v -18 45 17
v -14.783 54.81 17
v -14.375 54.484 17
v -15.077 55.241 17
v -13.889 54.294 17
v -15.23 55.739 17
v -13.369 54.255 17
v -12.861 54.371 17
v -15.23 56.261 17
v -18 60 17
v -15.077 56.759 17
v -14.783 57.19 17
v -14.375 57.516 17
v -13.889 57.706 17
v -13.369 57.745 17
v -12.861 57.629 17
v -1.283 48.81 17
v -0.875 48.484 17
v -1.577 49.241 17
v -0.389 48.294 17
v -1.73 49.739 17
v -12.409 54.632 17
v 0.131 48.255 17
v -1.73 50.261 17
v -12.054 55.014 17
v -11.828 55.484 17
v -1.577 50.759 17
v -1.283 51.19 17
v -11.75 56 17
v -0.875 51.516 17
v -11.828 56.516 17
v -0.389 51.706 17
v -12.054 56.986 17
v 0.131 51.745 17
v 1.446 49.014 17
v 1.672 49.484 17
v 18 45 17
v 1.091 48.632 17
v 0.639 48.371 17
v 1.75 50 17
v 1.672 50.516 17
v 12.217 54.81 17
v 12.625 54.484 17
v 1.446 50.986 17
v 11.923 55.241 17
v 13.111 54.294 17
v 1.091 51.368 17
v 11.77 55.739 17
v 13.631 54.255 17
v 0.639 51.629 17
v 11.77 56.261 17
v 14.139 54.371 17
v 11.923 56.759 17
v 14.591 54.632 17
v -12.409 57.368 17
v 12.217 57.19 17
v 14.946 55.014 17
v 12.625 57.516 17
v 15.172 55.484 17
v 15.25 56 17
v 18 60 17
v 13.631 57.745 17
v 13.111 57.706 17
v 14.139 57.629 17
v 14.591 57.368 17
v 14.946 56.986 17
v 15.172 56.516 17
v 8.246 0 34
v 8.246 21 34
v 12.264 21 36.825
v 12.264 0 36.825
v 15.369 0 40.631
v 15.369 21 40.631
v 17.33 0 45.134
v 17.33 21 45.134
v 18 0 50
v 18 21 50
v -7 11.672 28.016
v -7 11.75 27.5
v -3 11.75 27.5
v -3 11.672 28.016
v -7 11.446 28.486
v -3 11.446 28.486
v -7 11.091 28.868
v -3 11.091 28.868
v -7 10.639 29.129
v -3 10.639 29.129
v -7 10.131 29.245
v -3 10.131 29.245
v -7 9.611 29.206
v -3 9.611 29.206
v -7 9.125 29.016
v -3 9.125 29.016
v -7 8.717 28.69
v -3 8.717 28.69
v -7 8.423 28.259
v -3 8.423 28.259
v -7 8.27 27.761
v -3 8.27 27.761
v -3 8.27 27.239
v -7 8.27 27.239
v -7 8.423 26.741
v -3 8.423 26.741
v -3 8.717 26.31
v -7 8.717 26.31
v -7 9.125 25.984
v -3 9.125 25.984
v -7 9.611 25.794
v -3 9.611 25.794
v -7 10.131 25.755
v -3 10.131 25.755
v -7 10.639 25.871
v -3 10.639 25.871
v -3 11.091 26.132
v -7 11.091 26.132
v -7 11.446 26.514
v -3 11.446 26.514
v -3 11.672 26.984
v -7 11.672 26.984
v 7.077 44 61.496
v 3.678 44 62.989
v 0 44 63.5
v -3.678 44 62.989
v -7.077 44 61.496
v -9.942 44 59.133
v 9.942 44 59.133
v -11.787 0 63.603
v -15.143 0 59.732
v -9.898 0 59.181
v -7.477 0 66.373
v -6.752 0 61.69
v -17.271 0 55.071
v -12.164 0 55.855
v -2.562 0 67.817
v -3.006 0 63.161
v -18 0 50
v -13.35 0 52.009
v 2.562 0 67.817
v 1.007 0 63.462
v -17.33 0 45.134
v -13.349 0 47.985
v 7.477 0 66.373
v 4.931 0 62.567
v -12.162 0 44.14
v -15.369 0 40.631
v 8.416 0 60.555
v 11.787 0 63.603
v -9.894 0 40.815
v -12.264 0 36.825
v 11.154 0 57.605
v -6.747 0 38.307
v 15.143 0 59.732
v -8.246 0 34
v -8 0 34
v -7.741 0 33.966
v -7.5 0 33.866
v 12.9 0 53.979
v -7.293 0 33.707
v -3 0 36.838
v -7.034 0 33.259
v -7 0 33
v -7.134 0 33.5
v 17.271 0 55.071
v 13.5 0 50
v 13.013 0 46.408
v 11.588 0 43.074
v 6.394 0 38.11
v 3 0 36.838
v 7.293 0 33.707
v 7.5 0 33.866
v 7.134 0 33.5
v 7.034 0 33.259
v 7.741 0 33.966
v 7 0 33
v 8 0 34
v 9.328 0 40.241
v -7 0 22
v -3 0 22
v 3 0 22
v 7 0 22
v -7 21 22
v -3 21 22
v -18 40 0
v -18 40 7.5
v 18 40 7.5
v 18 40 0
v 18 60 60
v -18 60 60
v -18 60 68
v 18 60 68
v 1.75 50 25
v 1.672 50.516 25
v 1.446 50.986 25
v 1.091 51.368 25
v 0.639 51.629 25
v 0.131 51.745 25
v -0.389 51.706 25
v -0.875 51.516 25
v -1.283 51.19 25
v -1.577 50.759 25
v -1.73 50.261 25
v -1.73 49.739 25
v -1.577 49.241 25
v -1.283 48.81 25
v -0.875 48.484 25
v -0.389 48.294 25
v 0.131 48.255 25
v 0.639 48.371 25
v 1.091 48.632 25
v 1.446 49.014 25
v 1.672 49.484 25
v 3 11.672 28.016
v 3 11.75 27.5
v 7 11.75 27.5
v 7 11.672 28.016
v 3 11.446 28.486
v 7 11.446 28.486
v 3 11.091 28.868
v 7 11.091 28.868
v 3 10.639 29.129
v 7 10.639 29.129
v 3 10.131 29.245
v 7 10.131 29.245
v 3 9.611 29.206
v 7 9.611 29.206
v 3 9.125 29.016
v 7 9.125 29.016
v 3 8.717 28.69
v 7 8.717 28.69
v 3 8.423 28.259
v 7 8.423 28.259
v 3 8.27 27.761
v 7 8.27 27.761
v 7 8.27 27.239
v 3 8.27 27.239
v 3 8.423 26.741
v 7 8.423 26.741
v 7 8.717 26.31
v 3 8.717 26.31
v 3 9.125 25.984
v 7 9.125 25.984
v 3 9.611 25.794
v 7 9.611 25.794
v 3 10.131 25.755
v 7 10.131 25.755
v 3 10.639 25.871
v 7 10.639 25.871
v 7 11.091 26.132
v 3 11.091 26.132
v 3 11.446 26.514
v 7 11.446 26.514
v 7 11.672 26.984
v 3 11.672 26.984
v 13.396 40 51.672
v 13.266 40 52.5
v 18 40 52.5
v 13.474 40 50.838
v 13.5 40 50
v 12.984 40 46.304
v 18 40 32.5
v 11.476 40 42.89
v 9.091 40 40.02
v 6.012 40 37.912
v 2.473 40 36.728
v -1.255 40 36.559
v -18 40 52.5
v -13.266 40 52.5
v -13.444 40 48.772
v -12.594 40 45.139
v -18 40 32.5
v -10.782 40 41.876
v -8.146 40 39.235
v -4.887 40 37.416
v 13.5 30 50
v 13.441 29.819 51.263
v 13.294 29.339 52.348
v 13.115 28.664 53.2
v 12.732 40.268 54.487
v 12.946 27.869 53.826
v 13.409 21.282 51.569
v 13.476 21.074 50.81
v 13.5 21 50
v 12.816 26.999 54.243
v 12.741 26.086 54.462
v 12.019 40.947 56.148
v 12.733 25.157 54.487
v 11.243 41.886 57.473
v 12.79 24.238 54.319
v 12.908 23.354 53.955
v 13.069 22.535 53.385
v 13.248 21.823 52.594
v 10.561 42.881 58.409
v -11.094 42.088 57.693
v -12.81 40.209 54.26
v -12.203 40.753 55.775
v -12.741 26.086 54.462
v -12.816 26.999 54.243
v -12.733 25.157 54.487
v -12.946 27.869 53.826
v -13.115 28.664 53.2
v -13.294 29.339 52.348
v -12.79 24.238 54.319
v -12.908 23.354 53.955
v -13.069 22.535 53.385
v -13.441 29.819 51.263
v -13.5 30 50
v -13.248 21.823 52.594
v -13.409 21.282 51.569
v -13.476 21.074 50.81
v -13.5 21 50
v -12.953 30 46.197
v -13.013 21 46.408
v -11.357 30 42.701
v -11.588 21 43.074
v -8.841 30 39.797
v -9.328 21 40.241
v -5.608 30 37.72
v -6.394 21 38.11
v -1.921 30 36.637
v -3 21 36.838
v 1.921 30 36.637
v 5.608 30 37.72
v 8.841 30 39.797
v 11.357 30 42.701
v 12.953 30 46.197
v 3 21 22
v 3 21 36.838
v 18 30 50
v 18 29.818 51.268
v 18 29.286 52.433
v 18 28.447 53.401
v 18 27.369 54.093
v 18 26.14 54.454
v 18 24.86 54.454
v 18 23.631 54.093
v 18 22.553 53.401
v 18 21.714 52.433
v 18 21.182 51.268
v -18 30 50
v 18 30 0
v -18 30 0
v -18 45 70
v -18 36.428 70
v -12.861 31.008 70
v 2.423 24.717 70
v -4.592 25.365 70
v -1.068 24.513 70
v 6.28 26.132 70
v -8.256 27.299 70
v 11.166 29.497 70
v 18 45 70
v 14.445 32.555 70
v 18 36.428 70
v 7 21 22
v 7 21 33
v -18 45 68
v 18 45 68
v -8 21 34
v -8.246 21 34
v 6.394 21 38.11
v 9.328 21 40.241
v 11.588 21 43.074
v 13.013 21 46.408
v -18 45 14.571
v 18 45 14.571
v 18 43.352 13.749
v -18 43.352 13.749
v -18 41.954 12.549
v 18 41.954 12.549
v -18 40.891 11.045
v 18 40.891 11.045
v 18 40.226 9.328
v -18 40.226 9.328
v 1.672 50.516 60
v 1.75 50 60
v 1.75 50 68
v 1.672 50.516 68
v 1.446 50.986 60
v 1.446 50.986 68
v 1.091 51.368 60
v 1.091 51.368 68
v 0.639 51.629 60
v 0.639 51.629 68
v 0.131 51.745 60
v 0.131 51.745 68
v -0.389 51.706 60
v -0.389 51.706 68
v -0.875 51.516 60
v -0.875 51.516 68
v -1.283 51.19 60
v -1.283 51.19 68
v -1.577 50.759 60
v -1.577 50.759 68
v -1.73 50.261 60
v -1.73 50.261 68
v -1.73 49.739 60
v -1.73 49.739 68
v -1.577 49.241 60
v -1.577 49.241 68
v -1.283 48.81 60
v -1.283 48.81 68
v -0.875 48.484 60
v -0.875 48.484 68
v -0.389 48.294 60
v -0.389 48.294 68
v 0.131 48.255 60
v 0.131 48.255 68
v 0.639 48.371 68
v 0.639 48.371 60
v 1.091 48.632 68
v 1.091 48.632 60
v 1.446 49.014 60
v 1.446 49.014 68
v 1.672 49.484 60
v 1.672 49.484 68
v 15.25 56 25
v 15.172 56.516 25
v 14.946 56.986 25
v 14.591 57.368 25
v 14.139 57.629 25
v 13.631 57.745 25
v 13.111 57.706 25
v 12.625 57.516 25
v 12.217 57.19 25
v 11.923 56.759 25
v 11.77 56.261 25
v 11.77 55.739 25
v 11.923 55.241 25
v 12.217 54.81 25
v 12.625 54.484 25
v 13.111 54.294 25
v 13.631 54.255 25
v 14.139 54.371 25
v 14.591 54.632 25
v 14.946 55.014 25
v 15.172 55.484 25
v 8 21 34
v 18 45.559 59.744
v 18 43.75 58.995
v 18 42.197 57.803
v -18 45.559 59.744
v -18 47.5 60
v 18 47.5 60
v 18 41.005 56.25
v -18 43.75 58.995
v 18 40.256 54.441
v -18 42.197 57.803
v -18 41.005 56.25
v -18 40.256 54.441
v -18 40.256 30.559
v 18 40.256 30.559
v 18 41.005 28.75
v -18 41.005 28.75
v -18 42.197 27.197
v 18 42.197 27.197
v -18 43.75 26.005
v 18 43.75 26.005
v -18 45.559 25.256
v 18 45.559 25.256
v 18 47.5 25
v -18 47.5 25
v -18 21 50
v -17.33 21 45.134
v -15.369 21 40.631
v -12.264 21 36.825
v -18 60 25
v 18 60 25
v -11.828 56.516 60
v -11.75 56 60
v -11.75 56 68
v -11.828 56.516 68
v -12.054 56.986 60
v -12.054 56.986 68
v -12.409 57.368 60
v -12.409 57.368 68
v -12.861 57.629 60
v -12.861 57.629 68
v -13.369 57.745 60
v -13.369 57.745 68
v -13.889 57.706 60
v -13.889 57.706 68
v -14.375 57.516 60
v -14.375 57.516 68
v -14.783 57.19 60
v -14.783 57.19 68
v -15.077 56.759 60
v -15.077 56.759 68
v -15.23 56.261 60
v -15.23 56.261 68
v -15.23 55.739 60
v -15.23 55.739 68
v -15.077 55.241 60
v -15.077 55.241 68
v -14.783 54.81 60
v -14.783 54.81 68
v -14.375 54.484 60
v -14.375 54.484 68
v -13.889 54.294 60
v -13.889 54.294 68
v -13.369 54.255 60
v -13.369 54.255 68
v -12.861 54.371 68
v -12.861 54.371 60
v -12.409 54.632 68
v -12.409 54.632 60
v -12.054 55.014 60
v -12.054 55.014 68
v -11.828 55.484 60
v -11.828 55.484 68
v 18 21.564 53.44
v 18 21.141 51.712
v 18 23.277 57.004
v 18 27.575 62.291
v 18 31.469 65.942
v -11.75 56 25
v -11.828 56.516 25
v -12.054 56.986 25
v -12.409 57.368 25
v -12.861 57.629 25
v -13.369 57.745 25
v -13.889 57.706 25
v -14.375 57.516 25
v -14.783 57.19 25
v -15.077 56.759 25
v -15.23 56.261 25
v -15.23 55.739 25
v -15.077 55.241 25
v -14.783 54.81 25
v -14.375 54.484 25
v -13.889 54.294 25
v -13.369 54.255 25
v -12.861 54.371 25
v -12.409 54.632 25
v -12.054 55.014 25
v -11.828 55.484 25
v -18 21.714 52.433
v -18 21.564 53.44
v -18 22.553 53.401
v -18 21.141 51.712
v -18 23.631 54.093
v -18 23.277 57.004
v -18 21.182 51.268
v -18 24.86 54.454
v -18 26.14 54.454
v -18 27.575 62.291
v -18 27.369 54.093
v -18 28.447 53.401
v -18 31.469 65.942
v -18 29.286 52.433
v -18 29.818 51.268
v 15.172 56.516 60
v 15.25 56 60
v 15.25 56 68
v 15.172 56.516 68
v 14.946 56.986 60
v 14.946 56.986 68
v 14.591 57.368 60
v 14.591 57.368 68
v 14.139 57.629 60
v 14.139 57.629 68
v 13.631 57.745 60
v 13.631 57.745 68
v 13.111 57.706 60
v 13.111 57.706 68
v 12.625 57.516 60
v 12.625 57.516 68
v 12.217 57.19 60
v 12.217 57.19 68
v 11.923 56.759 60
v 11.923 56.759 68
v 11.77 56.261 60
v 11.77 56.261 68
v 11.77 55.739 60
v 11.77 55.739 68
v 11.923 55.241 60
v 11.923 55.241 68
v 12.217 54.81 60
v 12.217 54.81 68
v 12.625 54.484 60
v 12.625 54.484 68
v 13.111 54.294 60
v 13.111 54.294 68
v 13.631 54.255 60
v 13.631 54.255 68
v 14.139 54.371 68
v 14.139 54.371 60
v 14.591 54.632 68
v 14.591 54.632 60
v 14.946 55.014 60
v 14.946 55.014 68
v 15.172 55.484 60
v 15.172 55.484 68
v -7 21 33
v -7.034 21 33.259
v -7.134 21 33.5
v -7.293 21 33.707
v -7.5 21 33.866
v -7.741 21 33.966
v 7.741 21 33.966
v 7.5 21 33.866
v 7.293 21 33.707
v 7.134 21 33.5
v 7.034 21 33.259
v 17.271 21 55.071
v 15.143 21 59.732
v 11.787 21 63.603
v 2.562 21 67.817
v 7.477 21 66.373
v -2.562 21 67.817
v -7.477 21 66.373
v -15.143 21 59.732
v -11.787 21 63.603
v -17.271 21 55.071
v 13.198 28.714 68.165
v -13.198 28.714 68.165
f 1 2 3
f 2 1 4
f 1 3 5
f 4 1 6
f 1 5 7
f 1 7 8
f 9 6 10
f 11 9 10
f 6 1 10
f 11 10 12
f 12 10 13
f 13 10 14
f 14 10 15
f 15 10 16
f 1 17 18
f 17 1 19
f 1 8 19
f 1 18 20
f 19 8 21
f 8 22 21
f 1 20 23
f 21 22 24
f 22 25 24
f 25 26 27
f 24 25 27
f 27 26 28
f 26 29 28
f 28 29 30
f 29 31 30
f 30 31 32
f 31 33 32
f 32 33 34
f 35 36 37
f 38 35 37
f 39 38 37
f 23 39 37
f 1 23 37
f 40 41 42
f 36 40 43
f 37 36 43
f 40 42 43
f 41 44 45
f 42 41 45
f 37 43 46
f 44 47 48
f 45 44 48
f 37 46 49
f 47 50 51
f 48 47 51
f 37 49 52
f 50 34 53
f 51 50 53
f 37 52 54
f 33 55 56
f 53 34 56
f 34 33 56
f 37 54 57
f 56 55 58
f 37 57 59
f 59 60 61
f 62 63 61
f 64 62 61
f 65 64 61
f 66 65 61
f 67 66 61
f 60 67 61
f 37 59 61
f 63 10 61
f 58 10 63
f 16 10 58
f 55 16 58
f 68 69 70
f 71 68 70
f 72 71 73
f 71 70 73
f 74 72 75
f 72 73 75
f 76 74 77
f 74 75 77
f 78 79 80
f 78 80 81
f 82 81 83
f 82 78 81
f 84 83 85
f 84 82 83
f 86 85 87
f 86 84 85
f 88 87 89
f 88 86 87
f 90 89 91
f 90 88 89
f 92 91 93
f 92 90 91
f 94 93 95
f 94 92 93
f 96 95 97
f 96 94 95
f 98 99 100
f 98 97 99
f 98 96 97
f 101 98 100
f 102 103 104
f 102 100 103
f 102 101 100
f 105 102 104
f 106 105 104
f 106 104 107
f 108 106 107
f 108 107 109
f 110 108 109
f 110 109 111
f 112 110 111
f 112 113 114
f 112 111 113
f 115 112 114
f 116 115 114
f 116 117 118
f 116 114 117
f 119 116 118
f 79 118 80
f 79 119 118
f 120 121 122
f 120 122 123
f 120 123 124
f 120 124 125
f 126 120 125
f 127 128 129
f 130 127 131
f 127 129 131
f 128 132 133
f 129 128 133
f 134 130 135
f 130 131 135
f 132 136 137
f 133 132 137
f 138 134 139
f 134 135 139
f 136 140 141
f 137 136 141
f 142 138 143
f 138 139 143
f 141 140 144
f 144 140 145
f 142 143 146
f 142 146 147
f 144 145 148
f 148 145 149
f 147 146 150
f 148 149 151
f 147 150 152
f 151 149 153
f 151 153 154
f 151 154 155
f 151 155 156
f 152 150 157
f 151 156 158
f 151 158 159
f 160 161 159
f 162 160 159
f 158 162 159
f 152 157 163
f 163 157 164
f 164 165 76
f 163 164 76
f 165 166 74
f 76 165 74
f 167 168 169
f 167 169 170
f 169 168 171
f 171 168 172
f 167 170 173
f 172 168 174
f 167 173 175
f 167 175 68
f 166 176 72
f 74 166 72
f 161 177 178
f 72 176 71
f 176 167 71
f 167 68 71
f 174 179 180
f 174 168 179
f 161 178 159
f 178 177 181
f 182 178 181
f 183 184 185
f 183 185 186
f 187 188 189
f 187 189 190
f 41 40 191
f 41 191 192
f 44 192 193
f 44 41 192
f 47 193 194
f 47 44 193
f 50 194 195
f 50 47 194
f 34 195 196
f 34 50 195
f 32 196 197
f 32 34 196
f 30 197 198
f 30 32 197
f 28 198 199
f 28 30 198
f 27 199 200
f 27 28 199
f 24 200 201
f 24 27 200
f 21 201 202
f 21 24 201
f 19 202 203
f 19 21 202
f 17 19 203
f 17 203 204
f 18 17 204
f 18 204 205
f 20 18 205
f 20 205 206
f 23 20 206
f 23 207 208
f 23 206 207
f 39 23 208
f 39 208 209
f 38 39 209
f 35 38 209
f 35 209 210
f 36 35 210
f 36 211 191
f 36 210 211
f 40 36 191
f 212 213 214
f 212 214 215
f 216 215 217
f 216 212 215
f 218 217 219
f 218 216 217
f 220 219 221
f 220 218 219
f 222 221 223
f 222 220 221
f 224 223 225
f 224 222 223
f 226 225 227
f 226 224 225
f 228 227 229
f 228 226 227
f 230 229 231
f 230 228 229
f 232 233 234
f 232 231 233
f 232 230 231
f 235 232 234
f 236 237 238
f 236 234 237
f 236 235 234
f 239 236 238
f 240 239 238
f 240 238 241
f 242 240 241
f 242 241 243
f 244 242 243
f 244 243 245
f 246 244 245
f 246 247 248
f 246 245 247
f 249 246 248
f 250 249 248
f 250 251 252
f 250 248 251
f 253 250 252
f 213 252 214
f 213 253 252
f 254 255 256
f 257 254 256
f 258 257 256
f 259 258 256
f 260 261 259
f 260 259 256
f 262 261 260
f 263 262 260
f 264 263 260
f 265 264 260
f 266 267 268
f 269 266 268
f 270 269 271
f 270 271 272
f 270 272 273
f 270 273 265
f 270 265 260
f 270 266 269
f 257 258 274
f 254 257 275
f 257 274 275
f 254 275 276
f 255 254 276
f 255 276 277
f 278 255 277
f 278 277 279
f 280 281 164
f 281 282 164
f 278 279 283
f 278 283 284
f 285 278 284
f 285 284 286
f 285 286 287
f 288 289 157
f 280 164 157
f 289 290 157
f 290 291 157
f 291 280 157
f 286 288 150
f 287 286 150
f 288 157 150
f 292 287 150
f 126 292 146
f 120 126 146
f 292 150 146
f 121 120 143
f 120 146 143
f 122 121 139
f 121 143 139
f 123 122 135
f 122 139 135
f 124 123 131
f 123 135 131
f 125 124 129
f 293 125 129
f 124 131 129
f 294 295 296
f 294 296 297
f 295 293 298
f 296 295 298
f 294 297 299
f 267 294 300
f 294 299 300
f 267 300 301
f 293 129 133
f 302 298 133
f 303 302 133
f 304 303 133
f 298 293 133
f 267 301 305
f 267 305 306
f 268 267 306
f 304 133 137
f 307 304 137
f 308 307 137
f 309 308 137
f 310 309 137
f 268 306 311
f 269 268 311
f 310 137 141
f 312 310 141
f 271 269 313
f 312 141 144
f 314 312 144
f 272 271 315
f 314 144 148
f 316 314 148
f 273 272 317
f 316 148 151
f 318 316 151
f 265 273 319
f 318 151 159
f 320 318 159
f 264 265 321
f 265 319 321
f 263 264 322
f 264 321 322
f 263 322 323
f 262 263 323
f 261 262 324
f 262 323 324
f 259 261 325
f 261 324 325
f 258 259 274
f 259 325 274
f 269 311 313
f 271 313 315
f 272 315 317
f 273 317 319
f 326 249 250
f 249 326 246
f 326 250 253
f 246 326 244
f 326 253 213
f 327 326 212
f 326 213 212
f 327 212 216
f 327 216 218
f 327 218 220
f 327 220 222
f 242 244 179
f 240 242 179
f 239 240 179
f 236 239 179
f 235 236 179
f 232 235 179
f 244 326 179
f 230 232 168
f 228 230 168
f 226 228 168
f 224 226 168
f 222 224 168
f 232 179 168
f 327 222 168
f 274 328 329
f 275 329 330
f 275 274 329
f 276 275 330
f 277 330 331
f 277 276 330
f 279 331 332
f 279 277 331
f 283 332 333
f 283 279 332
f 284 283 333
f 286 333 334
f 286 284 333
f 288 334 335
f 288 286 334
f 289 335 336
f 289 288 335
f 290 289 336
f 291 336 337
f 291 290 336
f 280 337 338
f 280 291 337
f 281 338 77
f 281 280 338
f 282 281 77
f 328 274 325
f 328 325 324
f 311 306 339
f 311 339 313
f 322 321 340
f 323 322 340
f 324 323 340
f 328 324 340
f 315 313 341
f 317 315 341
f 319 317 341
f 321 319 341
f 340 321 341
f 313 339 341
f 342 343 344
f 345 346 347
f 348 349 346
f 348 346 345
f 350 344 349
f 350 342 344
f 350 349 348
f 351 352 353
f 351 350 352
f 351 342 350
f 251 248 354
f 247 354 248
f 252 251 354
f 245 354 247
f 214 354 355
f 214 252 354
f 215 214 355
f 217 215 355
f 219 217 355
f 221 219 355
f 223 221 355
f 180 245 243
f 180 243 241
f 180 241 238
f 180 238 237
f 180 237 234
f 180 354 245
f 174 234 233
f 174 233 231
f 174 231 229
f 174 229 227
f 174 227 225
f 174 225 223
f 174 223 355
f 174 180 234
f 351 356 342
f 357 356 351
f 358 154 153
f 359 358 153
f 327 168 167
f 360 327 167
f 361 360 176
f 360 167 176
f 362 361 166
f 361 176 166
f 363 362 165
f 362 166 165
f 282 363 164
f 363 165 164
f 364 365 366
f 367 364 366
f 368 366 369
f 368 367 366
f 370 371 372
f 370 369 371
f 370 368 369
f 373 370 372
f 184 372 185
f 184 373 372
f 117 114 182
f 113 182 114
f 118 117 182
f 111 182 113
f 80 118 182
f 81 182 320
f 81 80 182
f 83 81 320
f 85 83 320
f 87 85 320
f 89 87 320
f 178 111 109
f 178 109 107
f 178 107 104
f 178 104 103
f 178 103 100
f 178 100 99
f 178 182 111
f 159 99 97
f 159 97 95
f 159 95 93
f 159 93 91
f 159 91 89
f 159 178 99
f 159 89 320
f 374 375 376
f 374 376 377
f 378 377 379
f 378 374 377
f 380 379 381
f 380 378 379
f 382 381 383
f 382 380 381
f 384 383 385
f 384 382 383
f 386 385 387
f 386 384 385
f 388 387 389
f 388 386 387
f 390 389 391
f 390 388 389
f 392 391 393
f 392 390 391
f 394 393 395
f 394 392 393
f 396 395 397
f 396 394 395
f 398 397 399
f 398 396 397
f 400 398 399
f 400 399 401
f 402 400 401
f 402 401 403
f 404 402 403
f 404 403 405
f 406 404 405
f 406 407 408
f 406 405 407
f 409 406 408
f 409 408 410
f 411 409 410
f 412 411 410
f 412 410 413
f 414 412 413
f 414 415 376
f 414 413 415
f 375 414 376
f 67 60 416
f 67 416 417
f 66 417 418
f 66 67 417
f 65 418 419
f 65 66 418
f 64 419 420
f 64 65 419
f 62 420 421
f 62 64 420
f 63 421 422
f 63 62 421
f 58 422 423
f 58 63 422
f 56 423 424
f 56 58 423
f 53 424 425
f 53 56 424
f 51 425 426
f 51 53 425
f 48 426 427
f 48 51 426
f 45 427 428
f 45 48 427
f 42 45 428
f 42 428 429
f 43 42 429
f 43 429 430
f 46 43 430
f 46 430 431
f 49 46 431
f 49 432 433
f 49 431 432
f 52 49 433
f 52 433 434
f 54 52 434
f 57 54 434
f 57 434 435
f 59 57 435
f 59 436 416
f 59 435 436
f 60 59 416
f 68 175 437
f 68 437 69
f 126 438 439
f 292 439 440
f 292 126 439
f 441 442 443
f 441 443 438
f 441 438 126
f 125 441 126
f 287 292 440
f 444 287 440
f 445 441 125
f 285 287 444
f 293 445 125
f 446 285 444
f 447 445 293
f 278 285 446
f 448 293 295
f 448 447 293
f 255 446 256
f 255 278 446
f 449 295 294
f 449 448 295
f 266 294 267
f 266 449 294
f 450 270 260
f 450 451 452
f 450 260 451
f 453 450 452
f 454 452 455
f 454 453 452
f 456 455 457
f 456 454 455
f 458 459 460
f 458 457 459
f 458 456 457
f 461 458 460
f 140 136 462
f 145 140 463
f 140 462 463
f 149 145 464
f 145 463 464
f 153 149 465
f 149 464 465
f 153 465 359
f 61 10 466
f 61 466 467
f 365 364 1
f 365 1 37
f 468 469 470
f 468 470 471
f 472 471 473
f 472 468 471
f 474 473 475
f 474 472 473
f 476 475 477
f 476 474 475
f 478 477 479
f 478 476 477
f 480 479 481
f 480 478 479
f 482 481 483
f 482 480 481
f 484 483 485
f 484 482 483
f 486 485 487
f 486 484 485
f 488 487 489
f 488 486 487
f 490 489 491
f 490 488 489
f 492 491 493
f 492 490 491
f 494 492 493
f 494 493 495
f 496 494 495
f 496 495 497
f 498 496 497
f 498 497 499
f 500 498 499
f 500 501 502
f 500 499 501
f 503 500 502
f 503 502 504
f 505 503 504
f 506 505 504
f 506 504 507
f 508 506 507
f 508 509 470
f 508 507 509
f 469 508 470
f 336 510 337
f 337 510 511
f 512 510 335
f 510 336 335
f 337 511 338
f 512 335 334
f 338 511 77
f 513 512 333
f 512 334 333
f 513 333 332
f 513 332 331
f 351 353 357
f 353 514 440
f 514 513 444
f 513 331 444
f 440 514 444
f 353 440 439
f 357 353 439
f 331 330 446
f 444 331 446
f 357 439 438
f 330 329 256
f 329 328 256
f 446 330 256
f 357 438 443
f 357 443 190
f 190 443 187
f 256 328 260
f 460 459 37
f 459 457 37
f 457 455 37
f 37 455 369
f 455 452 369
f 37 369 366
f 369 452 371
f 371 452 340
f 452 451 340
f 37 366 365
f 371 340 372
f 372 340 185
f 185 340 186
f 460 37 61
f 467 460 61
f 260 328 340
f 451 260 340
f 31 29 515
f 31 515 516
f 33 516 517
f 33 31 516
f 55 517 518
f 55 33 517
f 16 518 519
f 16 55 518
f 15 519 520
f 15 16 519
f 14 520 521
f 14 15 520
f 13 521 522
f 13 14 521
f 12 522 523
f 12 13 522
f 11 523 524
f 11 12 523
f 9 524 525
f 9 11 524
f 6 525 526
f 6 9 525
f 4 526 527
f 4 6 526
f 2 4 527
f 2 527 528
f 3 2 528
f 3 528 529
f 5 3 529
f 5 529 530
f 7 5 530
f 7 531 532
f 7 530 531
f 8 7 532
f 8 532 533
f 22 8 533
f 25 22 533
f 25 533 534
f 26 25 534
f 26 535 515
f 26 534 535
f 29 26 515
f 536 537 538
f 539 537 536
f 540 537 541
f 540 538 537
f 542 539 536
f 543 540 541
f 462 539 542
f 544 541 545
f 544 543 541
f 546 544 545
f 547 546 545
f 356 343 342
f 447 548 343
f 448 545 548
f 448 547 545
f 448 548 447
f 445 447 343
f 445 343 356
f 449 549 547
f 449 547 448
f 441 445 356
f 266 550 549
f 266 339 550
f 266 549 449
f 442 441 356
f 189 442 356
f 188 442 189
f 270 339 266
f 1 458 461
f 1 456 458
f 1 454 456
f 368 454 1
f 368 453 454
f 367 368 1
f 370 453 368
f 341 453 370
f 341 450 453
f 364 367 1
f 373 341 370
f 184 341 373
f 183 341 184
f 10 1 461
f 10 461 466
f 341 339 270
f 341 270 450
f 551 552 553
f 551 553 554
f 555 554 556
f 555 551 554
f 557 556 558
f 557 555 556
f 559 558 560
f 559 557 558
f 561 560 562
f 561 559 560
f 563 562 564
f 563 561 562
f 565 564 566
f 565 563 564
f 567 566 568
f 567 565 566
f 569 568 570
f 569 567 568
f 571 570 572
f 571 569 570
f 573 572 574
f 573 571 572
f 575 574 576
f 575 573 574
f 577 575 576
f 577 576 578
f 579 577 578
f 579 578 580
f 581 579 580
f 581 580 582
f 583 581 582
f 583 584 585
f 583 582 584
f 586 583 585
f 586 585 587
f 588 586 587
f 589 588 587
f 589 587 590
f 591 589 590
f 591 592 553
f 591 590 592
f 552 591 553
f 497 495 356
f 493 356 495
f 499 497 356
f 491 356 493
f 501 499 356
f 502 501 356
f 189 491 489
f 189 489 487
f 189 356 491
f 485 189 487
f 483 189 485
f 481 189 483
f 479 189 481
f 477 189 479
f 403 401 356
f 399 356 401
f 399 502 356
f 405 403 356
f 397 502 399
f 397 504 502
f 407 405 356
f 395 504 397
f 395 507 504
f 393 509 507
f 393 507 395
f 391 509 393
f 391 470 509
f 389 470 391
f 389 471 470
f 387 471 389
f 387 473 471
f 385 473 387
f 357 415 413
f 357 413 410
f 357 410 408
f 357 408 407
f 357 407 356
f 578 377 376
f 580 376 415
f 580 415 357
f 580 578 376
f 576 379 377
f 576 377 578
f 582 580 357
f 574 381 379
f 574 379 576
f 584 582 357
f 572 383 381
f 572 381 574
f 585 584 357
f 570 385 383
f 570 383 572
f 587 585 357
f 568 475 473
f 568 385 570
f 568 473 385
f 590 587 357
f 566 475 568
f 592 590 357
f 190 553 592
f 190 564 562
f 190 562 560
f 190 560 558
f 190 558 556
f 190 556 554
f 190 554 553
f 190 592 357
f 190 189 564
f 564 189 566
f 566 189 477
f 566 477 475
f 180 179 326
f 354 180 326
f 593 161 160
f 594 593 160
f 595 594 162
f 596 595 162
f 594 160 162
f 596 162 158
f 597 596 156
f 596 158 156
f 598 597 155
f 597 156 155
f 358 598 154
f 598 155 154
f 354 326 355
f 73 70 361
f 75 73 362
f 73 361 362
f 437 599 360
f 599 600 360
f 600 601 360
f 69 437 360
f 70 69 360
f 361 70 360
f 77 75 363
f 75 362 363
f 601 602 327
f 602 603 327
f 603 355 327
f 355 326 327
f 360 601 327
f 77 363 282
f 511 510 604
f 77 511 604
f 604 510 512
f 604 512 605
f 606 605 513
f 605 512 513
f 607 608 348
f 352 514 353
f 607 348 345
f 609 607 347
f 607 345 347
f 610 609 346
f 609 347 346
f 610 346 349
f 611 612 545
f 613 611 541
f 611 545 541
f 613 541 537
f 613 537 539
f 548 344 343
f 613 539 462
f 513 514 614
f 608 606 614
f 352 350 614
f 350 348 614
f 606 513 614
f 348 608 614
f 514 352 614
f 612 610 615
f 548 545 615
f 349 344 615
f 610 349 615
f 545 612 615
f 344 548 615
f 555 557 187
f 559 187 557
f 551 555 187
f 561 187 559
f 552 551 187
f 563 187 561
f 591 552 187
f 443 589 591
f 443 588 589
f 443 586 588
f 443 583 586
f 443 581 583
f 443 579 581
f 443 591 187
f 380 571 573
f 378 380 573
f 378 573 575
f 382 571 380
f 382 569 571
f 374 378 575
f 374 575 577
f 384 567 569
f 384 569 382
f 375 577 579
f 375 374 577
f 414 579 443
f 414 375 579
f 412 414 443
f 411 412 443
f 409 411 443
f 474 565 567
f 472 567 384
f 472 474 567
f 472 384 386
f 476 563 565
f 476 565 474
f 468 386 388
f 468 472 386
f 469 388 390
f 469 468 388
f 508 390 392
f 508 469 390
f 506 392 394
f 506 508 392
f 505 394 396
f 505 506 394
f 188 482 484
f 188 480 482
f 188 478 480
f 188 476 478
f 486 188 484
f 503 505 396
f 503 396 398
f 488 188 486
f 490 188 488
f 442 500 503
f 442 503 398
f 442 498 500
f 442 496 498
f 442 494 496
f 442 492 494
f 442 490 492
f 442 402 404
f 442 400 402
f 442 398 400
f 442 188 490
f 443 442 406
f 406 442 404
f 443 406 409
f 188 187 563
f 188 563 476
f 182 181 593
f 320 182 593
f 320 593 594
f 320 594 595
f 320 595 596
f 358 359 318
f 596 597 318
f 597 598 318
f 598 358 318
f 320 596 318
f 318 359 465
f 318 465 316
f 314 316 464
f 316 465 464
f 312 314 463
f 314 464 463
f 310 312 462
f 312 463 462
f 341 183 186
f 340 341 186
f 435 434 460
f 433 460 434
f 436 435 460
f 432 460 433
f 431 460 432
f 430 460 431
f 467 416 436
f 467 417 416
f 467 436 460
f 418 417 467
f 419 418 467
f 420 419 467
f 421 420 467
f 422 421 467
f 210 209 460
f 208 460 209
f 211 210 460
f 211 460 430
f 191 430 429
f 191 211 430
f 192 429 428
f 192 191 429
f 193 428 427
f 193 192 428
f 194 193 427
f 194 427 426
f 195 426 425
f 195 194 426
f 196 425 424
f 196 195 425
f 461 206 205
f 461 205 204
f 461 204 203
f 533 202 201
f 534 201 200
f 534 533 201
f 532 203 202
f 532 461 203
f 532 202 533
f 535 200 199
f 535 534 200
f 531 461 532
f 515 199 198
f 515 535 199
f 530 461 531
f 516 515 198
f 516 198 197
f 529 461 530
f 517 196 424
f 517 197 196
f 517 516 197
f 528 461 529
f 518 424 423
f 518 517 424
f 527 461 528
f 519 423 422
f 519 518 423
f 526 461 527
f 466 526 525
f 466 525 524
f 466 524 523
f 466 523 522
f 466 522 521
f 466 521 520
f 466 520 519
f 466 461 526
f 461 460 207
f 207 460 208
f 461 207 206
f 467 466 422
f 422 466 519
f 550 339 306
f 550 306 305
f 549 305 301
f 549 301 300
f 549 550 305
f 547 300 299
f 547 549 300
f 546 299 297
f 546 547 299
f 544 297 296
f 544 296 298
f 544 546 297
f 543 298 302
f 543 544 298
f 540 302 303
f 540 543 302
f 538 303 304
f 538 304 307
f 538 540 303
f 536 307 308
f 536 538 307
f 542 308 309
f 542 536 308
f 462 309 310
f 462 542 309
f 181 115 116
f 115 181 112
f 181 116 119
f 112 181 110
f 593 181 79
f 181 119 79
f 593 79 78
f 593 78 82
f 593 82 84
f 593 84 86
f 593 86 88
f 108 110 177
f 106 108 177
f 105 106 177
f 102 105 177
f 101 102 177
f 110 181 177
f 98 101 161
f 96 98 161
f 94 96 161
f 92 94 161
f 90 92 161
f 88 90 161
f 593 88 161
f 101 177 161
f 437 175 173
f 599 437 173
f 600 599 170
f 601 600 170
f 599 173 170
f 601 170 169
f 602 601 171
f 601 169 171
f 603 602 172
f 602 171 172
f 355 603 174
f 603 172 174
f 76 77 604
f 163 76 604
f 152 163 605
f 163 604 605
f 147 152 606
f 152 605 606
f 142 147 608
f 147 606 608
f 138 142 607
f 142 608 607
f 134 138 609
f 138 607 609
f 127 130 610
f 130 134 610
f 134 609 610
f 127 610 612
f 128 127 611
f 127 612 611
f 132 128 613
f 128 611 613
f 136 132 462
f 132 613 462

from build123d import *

# Parameters (mm, degrees)
SKETCH021_R                          = 1.75
EXTRUDE005_DEPTH                     = 15
SKETCH020_W                          = 40
SKETCH020_H                          = 16
EXTRUDE003_DEPTH                     = 3
SKETCH016_AS_DRAWN_R                 = 13.5
EXTRUDE001_DEPTH                     = 45
EXTRUDE001_ONTO_SKETCH016_ROLL_ANGLE = 90
SKETCH017_AS_DRAWN_W                 = 6
SKETCH017_AS_DRAWN_H                 = 25
EXTRUDE002_DEPTH                     = 30
EXTRUDE002_ONTO_SKETCH017_ROLL_ANGLE = 90
EXTRUDE006_DEPTH                     = 15
EXTRUDE004_DEPTH                     = 3
SKETCH_R                             = 1.75
EXTRUDE_DEPTH                        = 38
SKETCH014_W                          = 22
SKETCH014_H                          = 20
BOX_W                                = 36
BOX_H                                = 60
BOX_DEPTH                            = 70


with BuildPart() as extrude005:
    # Sketch021 → Extrude005 (new body)
    with BuildSketch(Plane.XY):
        with Locations((-13.5, 56)):
            Circle(SKETCH021_R)
        with Locations((13.5, 56)):
            Circle(SKETCH021_R)
        with Locations((0, 50)):
            Circle(SKETCH021_R)
    extrude(amount=EXTRUDE005_DEPTH)


with BuildPart() as extrude005_1:
    # Extrude005 placement: moved
    add(extrude005.part.moved(Location((0, 0, 13))))


with BuildPart() as extrude003:
    # Sketch020 → Extrude003 (new body)
    with BuildSketch(Plane.XY):
        with Locations((0, 53)):
            Rectangle(SKETCH020_W, SKETCH020_H)
    extrude(amount=EXTRUDE003_DEPTH)


with BuildPart() as extrude003_1:
    # Extrude003 placement: moved
    add(extrude003.part.moved(Location((0, 0, 68))))


with BuildPart() as extrude_tube_hole:
    # Sketch016 as drawn → Extrude001 (new)
    with BuildSketch(Plane.XY):
        with Locations((0, 50)):
            Circle(SKETCH016_AS_DRAWN_R)
    extrude(amount=-EXTRUDE001_DEPTH)


with BuildPart() as extrude_tube_hole_1:
    # Extrude001 onto Sketch016 roll: moved
    add(extrude_tube_hole.part.rotate(Axis((0, 0, 0), (1, 0, 0)), EXTRUDE001_ONTO_SKETCH016_ROLL_ANGLE))


with BuildPart() as extrude_tube_hole_2:
    # Extrude001 onto Sketch016 placement: moved
    add(extrude_tube_hole_1.part)


with BuildPart() as extrude_tube_hole_3:
    # Extrude001 placement: moved
    add(extrude_tube_hole_2.part.moved(Location((0, -1, 0))))


with BuildPart() as arc_ext:
    # Sketch017 as drawn → Extrude002 (new)
    with BuildSketch(Plane.XY):
        with BuildLine():
            Line((8, 34), (20, 34))
            Line((20, 34), (20, 20))
            Line((20, 20), (7, 20))
            Line((7, 20), (7, 33))
            ThreePointArc((8, 34), (7.292893, 33.707107), (7, 33))
        make_face()
        with BuildLine():
            Line((-8, 34), (-20, 34))
            Line((-20, 34), (-20, 20))
            Line((-20, 20), (-7, 20))
            Line((-7, 20), (-7, 33))
            ThreePointArc((-7, 33), (-7.292893, 33.707107), (-8, 34))
        make_face()
        with Locations((0, 27.5)):
            Rectangle(SKETCH017_AS_DRAWN_W, SKETCH017_AS_DRAWN_H)
    extrude(amount=-EXTRUDE002_DEPTH)


with BuildPart() as arc_ext_1:
    # Extrude002 onto Sketch017 roll: moved
    add(arc_ext.part.rotate(Axis((0, 0, 0), (1, 0, 0)), EXTRUDE002_ONTO_SKETCH017_ROLL_ANGLE))


with BuildPart() as arc_ext_2:
    # Extrude002 onto Sketch017 placement: moved
    add(arc_ext_1.part)


with BuildPart() as arc_ext_3:
    # Extrude002 placement: moved
    add(arc_ext_2.part.moved(Location((0, -1, 0))))


with BuildPart() as extrude006:
    # Sketch021 → Extrude006 (new body)
    with BuildSketch(Plane.XY):
        with Locations((-13.5, 56)):
            Circle(SKETCH021_R)
        with Locations((13.5, 56)):
            Circle(SKETCH021_R)
        with Locations((0, 50)):
            Circle(SKETCH021_R)
    extrude(amount=EXTRUDE006_DEPTH)


with BuildPart() as extrude006_1:
    # Extrude006 placement: moved
    add(extrude006.part.moved(Location((0, 0, 58))))


with BuildPart() as extrude004:
    # Sketch020 → Extrude004 (new body)
    with BuildSketch(Plane.XY):
        with Locations((0, 53)):
            Rectangle(SKETCH020_W, SKETCH020_H)
    extrude(amount=EXTRUDE004_DEPTH)


with BuildPart() as extrude004_1:
    # Extrude004 placement: moved
    add(extrude004.part.moved(Location((0, 0, 14))))


with BuildPart() as fusion001:
    # Sketch → Extrude (new body)
    with BuildSketch(Plane.YZ):
        with Locations((10, 27.5)):
            Circle(SKETCH_R)
        with BuildLine():
            Line((61, 60), (47.5, 60))
            ThreePointArc((47.5, 60), (42.196699, 57.803301), (40, 52.5))
            Line((40, 52.5), (40, 32.5))
            ThreePointArc((40, 32.5), (42.196699, 27.196699), (47.5, 25))
            Line((47.5, 25), (61, 25))
            Line((61, 25), (61, 60))
        make_face()
        with BuildLine():
            Line((61, 15), (47.5, 15))
            ThreePointArc((47.5, 15), (42.196699, 12.803301), (40, 7.5))
            Line((40, 7.5), (40, -2))
            Line((40, -2), (61, -2))
            Line((61, -2), (61, 15))
        make_face()
        with BuildLine():
            Line((30, 50), (30, -2))
            Line((30, -2), (-2, -2))
            Line((-2, -2), (-2, 22))
            Line((-2, 22), (21, 22))
            Line((21, 22), (21, 50))
            ThreePointArc((30, 50), (25.5, 54.5), (21, 50))
        make_face()
    extrude(amount=EXTRUDE_DEPTH)


with BuildPart() as fusion001_1:
    # Extrude placement: moved
    add(fusion001.part.moved(Location((-19, 0, 0))))

    # Fusion001: union Extrude005, Extrude003, Extrude-tube-hole, arc-ext, Extrude006, Extrude004
    add(extrude005_1.part)
    add(extrude003_1.part)
    add(extrude_tube_hole_3.part)
    add(arc_ext_3.part)
    add(extrude006_1.part)
    add(extrude004_1.part)


with BuildPart() as sweep_body:
    # Sweep: sweep along a path in Sketch015
    with BuildLine(Plane.XZ) as sweep_path:
        ThreePointArc((4, 40.834849), (0, 60), (-4, 40.834849))
    # Sketch014 → Sweep (sweep)
    with BuildSketch(Plane(origin=(0, -1, 0), x_dir=(0, 1, 0), z_dir=(1, 0, 0))):
        with Locations((11, 78)):
            Rectangle(SKETCH014_W, SKETCH014_H)
    sweep(path=sweep_path.line)


with BuildPart() as fusion:
    # Sweep001: sweep along a path in Sketch019
    with BuildLine(Plane.XZ) as sweep001_path:
        ThreePointArc((10, 50), (0, 60), (-10, 50))
    # Sketch018 → Sweep001 (sweep)
    with BuildSketch(Plane(origin=(0, -1, 0), x_dir=(0, 1, 0), z_dir=(1, 0, 0))):
        Polygon((22, 68), (0, 68), (82.621778, 103), align=None)
    sweep(path=sweep001_path.line)

    # Fusion: union Sweep body
    add(sweep_body.part)


with BuildPart() as cut001:
    # Box → Box (new body)
    with BuildSketch(Plane(origin=(-18, 0, 0), x_dir=(1, 0, 0), z_dir=(0, 0, 1))):
        with Locations((18, 30)):
            Rectangle(BOX_W, BOX_H)
    extrude(amount=BOX_DEPTH)

    # Cut: cut Fusion
    add(fusion.part, mode=Mode.SUBTRACT)

    # Cut001: cut Fusion001
    add(fusion001_1.part, mode=Mode.SUBTRACT)


solid = cut001.part
